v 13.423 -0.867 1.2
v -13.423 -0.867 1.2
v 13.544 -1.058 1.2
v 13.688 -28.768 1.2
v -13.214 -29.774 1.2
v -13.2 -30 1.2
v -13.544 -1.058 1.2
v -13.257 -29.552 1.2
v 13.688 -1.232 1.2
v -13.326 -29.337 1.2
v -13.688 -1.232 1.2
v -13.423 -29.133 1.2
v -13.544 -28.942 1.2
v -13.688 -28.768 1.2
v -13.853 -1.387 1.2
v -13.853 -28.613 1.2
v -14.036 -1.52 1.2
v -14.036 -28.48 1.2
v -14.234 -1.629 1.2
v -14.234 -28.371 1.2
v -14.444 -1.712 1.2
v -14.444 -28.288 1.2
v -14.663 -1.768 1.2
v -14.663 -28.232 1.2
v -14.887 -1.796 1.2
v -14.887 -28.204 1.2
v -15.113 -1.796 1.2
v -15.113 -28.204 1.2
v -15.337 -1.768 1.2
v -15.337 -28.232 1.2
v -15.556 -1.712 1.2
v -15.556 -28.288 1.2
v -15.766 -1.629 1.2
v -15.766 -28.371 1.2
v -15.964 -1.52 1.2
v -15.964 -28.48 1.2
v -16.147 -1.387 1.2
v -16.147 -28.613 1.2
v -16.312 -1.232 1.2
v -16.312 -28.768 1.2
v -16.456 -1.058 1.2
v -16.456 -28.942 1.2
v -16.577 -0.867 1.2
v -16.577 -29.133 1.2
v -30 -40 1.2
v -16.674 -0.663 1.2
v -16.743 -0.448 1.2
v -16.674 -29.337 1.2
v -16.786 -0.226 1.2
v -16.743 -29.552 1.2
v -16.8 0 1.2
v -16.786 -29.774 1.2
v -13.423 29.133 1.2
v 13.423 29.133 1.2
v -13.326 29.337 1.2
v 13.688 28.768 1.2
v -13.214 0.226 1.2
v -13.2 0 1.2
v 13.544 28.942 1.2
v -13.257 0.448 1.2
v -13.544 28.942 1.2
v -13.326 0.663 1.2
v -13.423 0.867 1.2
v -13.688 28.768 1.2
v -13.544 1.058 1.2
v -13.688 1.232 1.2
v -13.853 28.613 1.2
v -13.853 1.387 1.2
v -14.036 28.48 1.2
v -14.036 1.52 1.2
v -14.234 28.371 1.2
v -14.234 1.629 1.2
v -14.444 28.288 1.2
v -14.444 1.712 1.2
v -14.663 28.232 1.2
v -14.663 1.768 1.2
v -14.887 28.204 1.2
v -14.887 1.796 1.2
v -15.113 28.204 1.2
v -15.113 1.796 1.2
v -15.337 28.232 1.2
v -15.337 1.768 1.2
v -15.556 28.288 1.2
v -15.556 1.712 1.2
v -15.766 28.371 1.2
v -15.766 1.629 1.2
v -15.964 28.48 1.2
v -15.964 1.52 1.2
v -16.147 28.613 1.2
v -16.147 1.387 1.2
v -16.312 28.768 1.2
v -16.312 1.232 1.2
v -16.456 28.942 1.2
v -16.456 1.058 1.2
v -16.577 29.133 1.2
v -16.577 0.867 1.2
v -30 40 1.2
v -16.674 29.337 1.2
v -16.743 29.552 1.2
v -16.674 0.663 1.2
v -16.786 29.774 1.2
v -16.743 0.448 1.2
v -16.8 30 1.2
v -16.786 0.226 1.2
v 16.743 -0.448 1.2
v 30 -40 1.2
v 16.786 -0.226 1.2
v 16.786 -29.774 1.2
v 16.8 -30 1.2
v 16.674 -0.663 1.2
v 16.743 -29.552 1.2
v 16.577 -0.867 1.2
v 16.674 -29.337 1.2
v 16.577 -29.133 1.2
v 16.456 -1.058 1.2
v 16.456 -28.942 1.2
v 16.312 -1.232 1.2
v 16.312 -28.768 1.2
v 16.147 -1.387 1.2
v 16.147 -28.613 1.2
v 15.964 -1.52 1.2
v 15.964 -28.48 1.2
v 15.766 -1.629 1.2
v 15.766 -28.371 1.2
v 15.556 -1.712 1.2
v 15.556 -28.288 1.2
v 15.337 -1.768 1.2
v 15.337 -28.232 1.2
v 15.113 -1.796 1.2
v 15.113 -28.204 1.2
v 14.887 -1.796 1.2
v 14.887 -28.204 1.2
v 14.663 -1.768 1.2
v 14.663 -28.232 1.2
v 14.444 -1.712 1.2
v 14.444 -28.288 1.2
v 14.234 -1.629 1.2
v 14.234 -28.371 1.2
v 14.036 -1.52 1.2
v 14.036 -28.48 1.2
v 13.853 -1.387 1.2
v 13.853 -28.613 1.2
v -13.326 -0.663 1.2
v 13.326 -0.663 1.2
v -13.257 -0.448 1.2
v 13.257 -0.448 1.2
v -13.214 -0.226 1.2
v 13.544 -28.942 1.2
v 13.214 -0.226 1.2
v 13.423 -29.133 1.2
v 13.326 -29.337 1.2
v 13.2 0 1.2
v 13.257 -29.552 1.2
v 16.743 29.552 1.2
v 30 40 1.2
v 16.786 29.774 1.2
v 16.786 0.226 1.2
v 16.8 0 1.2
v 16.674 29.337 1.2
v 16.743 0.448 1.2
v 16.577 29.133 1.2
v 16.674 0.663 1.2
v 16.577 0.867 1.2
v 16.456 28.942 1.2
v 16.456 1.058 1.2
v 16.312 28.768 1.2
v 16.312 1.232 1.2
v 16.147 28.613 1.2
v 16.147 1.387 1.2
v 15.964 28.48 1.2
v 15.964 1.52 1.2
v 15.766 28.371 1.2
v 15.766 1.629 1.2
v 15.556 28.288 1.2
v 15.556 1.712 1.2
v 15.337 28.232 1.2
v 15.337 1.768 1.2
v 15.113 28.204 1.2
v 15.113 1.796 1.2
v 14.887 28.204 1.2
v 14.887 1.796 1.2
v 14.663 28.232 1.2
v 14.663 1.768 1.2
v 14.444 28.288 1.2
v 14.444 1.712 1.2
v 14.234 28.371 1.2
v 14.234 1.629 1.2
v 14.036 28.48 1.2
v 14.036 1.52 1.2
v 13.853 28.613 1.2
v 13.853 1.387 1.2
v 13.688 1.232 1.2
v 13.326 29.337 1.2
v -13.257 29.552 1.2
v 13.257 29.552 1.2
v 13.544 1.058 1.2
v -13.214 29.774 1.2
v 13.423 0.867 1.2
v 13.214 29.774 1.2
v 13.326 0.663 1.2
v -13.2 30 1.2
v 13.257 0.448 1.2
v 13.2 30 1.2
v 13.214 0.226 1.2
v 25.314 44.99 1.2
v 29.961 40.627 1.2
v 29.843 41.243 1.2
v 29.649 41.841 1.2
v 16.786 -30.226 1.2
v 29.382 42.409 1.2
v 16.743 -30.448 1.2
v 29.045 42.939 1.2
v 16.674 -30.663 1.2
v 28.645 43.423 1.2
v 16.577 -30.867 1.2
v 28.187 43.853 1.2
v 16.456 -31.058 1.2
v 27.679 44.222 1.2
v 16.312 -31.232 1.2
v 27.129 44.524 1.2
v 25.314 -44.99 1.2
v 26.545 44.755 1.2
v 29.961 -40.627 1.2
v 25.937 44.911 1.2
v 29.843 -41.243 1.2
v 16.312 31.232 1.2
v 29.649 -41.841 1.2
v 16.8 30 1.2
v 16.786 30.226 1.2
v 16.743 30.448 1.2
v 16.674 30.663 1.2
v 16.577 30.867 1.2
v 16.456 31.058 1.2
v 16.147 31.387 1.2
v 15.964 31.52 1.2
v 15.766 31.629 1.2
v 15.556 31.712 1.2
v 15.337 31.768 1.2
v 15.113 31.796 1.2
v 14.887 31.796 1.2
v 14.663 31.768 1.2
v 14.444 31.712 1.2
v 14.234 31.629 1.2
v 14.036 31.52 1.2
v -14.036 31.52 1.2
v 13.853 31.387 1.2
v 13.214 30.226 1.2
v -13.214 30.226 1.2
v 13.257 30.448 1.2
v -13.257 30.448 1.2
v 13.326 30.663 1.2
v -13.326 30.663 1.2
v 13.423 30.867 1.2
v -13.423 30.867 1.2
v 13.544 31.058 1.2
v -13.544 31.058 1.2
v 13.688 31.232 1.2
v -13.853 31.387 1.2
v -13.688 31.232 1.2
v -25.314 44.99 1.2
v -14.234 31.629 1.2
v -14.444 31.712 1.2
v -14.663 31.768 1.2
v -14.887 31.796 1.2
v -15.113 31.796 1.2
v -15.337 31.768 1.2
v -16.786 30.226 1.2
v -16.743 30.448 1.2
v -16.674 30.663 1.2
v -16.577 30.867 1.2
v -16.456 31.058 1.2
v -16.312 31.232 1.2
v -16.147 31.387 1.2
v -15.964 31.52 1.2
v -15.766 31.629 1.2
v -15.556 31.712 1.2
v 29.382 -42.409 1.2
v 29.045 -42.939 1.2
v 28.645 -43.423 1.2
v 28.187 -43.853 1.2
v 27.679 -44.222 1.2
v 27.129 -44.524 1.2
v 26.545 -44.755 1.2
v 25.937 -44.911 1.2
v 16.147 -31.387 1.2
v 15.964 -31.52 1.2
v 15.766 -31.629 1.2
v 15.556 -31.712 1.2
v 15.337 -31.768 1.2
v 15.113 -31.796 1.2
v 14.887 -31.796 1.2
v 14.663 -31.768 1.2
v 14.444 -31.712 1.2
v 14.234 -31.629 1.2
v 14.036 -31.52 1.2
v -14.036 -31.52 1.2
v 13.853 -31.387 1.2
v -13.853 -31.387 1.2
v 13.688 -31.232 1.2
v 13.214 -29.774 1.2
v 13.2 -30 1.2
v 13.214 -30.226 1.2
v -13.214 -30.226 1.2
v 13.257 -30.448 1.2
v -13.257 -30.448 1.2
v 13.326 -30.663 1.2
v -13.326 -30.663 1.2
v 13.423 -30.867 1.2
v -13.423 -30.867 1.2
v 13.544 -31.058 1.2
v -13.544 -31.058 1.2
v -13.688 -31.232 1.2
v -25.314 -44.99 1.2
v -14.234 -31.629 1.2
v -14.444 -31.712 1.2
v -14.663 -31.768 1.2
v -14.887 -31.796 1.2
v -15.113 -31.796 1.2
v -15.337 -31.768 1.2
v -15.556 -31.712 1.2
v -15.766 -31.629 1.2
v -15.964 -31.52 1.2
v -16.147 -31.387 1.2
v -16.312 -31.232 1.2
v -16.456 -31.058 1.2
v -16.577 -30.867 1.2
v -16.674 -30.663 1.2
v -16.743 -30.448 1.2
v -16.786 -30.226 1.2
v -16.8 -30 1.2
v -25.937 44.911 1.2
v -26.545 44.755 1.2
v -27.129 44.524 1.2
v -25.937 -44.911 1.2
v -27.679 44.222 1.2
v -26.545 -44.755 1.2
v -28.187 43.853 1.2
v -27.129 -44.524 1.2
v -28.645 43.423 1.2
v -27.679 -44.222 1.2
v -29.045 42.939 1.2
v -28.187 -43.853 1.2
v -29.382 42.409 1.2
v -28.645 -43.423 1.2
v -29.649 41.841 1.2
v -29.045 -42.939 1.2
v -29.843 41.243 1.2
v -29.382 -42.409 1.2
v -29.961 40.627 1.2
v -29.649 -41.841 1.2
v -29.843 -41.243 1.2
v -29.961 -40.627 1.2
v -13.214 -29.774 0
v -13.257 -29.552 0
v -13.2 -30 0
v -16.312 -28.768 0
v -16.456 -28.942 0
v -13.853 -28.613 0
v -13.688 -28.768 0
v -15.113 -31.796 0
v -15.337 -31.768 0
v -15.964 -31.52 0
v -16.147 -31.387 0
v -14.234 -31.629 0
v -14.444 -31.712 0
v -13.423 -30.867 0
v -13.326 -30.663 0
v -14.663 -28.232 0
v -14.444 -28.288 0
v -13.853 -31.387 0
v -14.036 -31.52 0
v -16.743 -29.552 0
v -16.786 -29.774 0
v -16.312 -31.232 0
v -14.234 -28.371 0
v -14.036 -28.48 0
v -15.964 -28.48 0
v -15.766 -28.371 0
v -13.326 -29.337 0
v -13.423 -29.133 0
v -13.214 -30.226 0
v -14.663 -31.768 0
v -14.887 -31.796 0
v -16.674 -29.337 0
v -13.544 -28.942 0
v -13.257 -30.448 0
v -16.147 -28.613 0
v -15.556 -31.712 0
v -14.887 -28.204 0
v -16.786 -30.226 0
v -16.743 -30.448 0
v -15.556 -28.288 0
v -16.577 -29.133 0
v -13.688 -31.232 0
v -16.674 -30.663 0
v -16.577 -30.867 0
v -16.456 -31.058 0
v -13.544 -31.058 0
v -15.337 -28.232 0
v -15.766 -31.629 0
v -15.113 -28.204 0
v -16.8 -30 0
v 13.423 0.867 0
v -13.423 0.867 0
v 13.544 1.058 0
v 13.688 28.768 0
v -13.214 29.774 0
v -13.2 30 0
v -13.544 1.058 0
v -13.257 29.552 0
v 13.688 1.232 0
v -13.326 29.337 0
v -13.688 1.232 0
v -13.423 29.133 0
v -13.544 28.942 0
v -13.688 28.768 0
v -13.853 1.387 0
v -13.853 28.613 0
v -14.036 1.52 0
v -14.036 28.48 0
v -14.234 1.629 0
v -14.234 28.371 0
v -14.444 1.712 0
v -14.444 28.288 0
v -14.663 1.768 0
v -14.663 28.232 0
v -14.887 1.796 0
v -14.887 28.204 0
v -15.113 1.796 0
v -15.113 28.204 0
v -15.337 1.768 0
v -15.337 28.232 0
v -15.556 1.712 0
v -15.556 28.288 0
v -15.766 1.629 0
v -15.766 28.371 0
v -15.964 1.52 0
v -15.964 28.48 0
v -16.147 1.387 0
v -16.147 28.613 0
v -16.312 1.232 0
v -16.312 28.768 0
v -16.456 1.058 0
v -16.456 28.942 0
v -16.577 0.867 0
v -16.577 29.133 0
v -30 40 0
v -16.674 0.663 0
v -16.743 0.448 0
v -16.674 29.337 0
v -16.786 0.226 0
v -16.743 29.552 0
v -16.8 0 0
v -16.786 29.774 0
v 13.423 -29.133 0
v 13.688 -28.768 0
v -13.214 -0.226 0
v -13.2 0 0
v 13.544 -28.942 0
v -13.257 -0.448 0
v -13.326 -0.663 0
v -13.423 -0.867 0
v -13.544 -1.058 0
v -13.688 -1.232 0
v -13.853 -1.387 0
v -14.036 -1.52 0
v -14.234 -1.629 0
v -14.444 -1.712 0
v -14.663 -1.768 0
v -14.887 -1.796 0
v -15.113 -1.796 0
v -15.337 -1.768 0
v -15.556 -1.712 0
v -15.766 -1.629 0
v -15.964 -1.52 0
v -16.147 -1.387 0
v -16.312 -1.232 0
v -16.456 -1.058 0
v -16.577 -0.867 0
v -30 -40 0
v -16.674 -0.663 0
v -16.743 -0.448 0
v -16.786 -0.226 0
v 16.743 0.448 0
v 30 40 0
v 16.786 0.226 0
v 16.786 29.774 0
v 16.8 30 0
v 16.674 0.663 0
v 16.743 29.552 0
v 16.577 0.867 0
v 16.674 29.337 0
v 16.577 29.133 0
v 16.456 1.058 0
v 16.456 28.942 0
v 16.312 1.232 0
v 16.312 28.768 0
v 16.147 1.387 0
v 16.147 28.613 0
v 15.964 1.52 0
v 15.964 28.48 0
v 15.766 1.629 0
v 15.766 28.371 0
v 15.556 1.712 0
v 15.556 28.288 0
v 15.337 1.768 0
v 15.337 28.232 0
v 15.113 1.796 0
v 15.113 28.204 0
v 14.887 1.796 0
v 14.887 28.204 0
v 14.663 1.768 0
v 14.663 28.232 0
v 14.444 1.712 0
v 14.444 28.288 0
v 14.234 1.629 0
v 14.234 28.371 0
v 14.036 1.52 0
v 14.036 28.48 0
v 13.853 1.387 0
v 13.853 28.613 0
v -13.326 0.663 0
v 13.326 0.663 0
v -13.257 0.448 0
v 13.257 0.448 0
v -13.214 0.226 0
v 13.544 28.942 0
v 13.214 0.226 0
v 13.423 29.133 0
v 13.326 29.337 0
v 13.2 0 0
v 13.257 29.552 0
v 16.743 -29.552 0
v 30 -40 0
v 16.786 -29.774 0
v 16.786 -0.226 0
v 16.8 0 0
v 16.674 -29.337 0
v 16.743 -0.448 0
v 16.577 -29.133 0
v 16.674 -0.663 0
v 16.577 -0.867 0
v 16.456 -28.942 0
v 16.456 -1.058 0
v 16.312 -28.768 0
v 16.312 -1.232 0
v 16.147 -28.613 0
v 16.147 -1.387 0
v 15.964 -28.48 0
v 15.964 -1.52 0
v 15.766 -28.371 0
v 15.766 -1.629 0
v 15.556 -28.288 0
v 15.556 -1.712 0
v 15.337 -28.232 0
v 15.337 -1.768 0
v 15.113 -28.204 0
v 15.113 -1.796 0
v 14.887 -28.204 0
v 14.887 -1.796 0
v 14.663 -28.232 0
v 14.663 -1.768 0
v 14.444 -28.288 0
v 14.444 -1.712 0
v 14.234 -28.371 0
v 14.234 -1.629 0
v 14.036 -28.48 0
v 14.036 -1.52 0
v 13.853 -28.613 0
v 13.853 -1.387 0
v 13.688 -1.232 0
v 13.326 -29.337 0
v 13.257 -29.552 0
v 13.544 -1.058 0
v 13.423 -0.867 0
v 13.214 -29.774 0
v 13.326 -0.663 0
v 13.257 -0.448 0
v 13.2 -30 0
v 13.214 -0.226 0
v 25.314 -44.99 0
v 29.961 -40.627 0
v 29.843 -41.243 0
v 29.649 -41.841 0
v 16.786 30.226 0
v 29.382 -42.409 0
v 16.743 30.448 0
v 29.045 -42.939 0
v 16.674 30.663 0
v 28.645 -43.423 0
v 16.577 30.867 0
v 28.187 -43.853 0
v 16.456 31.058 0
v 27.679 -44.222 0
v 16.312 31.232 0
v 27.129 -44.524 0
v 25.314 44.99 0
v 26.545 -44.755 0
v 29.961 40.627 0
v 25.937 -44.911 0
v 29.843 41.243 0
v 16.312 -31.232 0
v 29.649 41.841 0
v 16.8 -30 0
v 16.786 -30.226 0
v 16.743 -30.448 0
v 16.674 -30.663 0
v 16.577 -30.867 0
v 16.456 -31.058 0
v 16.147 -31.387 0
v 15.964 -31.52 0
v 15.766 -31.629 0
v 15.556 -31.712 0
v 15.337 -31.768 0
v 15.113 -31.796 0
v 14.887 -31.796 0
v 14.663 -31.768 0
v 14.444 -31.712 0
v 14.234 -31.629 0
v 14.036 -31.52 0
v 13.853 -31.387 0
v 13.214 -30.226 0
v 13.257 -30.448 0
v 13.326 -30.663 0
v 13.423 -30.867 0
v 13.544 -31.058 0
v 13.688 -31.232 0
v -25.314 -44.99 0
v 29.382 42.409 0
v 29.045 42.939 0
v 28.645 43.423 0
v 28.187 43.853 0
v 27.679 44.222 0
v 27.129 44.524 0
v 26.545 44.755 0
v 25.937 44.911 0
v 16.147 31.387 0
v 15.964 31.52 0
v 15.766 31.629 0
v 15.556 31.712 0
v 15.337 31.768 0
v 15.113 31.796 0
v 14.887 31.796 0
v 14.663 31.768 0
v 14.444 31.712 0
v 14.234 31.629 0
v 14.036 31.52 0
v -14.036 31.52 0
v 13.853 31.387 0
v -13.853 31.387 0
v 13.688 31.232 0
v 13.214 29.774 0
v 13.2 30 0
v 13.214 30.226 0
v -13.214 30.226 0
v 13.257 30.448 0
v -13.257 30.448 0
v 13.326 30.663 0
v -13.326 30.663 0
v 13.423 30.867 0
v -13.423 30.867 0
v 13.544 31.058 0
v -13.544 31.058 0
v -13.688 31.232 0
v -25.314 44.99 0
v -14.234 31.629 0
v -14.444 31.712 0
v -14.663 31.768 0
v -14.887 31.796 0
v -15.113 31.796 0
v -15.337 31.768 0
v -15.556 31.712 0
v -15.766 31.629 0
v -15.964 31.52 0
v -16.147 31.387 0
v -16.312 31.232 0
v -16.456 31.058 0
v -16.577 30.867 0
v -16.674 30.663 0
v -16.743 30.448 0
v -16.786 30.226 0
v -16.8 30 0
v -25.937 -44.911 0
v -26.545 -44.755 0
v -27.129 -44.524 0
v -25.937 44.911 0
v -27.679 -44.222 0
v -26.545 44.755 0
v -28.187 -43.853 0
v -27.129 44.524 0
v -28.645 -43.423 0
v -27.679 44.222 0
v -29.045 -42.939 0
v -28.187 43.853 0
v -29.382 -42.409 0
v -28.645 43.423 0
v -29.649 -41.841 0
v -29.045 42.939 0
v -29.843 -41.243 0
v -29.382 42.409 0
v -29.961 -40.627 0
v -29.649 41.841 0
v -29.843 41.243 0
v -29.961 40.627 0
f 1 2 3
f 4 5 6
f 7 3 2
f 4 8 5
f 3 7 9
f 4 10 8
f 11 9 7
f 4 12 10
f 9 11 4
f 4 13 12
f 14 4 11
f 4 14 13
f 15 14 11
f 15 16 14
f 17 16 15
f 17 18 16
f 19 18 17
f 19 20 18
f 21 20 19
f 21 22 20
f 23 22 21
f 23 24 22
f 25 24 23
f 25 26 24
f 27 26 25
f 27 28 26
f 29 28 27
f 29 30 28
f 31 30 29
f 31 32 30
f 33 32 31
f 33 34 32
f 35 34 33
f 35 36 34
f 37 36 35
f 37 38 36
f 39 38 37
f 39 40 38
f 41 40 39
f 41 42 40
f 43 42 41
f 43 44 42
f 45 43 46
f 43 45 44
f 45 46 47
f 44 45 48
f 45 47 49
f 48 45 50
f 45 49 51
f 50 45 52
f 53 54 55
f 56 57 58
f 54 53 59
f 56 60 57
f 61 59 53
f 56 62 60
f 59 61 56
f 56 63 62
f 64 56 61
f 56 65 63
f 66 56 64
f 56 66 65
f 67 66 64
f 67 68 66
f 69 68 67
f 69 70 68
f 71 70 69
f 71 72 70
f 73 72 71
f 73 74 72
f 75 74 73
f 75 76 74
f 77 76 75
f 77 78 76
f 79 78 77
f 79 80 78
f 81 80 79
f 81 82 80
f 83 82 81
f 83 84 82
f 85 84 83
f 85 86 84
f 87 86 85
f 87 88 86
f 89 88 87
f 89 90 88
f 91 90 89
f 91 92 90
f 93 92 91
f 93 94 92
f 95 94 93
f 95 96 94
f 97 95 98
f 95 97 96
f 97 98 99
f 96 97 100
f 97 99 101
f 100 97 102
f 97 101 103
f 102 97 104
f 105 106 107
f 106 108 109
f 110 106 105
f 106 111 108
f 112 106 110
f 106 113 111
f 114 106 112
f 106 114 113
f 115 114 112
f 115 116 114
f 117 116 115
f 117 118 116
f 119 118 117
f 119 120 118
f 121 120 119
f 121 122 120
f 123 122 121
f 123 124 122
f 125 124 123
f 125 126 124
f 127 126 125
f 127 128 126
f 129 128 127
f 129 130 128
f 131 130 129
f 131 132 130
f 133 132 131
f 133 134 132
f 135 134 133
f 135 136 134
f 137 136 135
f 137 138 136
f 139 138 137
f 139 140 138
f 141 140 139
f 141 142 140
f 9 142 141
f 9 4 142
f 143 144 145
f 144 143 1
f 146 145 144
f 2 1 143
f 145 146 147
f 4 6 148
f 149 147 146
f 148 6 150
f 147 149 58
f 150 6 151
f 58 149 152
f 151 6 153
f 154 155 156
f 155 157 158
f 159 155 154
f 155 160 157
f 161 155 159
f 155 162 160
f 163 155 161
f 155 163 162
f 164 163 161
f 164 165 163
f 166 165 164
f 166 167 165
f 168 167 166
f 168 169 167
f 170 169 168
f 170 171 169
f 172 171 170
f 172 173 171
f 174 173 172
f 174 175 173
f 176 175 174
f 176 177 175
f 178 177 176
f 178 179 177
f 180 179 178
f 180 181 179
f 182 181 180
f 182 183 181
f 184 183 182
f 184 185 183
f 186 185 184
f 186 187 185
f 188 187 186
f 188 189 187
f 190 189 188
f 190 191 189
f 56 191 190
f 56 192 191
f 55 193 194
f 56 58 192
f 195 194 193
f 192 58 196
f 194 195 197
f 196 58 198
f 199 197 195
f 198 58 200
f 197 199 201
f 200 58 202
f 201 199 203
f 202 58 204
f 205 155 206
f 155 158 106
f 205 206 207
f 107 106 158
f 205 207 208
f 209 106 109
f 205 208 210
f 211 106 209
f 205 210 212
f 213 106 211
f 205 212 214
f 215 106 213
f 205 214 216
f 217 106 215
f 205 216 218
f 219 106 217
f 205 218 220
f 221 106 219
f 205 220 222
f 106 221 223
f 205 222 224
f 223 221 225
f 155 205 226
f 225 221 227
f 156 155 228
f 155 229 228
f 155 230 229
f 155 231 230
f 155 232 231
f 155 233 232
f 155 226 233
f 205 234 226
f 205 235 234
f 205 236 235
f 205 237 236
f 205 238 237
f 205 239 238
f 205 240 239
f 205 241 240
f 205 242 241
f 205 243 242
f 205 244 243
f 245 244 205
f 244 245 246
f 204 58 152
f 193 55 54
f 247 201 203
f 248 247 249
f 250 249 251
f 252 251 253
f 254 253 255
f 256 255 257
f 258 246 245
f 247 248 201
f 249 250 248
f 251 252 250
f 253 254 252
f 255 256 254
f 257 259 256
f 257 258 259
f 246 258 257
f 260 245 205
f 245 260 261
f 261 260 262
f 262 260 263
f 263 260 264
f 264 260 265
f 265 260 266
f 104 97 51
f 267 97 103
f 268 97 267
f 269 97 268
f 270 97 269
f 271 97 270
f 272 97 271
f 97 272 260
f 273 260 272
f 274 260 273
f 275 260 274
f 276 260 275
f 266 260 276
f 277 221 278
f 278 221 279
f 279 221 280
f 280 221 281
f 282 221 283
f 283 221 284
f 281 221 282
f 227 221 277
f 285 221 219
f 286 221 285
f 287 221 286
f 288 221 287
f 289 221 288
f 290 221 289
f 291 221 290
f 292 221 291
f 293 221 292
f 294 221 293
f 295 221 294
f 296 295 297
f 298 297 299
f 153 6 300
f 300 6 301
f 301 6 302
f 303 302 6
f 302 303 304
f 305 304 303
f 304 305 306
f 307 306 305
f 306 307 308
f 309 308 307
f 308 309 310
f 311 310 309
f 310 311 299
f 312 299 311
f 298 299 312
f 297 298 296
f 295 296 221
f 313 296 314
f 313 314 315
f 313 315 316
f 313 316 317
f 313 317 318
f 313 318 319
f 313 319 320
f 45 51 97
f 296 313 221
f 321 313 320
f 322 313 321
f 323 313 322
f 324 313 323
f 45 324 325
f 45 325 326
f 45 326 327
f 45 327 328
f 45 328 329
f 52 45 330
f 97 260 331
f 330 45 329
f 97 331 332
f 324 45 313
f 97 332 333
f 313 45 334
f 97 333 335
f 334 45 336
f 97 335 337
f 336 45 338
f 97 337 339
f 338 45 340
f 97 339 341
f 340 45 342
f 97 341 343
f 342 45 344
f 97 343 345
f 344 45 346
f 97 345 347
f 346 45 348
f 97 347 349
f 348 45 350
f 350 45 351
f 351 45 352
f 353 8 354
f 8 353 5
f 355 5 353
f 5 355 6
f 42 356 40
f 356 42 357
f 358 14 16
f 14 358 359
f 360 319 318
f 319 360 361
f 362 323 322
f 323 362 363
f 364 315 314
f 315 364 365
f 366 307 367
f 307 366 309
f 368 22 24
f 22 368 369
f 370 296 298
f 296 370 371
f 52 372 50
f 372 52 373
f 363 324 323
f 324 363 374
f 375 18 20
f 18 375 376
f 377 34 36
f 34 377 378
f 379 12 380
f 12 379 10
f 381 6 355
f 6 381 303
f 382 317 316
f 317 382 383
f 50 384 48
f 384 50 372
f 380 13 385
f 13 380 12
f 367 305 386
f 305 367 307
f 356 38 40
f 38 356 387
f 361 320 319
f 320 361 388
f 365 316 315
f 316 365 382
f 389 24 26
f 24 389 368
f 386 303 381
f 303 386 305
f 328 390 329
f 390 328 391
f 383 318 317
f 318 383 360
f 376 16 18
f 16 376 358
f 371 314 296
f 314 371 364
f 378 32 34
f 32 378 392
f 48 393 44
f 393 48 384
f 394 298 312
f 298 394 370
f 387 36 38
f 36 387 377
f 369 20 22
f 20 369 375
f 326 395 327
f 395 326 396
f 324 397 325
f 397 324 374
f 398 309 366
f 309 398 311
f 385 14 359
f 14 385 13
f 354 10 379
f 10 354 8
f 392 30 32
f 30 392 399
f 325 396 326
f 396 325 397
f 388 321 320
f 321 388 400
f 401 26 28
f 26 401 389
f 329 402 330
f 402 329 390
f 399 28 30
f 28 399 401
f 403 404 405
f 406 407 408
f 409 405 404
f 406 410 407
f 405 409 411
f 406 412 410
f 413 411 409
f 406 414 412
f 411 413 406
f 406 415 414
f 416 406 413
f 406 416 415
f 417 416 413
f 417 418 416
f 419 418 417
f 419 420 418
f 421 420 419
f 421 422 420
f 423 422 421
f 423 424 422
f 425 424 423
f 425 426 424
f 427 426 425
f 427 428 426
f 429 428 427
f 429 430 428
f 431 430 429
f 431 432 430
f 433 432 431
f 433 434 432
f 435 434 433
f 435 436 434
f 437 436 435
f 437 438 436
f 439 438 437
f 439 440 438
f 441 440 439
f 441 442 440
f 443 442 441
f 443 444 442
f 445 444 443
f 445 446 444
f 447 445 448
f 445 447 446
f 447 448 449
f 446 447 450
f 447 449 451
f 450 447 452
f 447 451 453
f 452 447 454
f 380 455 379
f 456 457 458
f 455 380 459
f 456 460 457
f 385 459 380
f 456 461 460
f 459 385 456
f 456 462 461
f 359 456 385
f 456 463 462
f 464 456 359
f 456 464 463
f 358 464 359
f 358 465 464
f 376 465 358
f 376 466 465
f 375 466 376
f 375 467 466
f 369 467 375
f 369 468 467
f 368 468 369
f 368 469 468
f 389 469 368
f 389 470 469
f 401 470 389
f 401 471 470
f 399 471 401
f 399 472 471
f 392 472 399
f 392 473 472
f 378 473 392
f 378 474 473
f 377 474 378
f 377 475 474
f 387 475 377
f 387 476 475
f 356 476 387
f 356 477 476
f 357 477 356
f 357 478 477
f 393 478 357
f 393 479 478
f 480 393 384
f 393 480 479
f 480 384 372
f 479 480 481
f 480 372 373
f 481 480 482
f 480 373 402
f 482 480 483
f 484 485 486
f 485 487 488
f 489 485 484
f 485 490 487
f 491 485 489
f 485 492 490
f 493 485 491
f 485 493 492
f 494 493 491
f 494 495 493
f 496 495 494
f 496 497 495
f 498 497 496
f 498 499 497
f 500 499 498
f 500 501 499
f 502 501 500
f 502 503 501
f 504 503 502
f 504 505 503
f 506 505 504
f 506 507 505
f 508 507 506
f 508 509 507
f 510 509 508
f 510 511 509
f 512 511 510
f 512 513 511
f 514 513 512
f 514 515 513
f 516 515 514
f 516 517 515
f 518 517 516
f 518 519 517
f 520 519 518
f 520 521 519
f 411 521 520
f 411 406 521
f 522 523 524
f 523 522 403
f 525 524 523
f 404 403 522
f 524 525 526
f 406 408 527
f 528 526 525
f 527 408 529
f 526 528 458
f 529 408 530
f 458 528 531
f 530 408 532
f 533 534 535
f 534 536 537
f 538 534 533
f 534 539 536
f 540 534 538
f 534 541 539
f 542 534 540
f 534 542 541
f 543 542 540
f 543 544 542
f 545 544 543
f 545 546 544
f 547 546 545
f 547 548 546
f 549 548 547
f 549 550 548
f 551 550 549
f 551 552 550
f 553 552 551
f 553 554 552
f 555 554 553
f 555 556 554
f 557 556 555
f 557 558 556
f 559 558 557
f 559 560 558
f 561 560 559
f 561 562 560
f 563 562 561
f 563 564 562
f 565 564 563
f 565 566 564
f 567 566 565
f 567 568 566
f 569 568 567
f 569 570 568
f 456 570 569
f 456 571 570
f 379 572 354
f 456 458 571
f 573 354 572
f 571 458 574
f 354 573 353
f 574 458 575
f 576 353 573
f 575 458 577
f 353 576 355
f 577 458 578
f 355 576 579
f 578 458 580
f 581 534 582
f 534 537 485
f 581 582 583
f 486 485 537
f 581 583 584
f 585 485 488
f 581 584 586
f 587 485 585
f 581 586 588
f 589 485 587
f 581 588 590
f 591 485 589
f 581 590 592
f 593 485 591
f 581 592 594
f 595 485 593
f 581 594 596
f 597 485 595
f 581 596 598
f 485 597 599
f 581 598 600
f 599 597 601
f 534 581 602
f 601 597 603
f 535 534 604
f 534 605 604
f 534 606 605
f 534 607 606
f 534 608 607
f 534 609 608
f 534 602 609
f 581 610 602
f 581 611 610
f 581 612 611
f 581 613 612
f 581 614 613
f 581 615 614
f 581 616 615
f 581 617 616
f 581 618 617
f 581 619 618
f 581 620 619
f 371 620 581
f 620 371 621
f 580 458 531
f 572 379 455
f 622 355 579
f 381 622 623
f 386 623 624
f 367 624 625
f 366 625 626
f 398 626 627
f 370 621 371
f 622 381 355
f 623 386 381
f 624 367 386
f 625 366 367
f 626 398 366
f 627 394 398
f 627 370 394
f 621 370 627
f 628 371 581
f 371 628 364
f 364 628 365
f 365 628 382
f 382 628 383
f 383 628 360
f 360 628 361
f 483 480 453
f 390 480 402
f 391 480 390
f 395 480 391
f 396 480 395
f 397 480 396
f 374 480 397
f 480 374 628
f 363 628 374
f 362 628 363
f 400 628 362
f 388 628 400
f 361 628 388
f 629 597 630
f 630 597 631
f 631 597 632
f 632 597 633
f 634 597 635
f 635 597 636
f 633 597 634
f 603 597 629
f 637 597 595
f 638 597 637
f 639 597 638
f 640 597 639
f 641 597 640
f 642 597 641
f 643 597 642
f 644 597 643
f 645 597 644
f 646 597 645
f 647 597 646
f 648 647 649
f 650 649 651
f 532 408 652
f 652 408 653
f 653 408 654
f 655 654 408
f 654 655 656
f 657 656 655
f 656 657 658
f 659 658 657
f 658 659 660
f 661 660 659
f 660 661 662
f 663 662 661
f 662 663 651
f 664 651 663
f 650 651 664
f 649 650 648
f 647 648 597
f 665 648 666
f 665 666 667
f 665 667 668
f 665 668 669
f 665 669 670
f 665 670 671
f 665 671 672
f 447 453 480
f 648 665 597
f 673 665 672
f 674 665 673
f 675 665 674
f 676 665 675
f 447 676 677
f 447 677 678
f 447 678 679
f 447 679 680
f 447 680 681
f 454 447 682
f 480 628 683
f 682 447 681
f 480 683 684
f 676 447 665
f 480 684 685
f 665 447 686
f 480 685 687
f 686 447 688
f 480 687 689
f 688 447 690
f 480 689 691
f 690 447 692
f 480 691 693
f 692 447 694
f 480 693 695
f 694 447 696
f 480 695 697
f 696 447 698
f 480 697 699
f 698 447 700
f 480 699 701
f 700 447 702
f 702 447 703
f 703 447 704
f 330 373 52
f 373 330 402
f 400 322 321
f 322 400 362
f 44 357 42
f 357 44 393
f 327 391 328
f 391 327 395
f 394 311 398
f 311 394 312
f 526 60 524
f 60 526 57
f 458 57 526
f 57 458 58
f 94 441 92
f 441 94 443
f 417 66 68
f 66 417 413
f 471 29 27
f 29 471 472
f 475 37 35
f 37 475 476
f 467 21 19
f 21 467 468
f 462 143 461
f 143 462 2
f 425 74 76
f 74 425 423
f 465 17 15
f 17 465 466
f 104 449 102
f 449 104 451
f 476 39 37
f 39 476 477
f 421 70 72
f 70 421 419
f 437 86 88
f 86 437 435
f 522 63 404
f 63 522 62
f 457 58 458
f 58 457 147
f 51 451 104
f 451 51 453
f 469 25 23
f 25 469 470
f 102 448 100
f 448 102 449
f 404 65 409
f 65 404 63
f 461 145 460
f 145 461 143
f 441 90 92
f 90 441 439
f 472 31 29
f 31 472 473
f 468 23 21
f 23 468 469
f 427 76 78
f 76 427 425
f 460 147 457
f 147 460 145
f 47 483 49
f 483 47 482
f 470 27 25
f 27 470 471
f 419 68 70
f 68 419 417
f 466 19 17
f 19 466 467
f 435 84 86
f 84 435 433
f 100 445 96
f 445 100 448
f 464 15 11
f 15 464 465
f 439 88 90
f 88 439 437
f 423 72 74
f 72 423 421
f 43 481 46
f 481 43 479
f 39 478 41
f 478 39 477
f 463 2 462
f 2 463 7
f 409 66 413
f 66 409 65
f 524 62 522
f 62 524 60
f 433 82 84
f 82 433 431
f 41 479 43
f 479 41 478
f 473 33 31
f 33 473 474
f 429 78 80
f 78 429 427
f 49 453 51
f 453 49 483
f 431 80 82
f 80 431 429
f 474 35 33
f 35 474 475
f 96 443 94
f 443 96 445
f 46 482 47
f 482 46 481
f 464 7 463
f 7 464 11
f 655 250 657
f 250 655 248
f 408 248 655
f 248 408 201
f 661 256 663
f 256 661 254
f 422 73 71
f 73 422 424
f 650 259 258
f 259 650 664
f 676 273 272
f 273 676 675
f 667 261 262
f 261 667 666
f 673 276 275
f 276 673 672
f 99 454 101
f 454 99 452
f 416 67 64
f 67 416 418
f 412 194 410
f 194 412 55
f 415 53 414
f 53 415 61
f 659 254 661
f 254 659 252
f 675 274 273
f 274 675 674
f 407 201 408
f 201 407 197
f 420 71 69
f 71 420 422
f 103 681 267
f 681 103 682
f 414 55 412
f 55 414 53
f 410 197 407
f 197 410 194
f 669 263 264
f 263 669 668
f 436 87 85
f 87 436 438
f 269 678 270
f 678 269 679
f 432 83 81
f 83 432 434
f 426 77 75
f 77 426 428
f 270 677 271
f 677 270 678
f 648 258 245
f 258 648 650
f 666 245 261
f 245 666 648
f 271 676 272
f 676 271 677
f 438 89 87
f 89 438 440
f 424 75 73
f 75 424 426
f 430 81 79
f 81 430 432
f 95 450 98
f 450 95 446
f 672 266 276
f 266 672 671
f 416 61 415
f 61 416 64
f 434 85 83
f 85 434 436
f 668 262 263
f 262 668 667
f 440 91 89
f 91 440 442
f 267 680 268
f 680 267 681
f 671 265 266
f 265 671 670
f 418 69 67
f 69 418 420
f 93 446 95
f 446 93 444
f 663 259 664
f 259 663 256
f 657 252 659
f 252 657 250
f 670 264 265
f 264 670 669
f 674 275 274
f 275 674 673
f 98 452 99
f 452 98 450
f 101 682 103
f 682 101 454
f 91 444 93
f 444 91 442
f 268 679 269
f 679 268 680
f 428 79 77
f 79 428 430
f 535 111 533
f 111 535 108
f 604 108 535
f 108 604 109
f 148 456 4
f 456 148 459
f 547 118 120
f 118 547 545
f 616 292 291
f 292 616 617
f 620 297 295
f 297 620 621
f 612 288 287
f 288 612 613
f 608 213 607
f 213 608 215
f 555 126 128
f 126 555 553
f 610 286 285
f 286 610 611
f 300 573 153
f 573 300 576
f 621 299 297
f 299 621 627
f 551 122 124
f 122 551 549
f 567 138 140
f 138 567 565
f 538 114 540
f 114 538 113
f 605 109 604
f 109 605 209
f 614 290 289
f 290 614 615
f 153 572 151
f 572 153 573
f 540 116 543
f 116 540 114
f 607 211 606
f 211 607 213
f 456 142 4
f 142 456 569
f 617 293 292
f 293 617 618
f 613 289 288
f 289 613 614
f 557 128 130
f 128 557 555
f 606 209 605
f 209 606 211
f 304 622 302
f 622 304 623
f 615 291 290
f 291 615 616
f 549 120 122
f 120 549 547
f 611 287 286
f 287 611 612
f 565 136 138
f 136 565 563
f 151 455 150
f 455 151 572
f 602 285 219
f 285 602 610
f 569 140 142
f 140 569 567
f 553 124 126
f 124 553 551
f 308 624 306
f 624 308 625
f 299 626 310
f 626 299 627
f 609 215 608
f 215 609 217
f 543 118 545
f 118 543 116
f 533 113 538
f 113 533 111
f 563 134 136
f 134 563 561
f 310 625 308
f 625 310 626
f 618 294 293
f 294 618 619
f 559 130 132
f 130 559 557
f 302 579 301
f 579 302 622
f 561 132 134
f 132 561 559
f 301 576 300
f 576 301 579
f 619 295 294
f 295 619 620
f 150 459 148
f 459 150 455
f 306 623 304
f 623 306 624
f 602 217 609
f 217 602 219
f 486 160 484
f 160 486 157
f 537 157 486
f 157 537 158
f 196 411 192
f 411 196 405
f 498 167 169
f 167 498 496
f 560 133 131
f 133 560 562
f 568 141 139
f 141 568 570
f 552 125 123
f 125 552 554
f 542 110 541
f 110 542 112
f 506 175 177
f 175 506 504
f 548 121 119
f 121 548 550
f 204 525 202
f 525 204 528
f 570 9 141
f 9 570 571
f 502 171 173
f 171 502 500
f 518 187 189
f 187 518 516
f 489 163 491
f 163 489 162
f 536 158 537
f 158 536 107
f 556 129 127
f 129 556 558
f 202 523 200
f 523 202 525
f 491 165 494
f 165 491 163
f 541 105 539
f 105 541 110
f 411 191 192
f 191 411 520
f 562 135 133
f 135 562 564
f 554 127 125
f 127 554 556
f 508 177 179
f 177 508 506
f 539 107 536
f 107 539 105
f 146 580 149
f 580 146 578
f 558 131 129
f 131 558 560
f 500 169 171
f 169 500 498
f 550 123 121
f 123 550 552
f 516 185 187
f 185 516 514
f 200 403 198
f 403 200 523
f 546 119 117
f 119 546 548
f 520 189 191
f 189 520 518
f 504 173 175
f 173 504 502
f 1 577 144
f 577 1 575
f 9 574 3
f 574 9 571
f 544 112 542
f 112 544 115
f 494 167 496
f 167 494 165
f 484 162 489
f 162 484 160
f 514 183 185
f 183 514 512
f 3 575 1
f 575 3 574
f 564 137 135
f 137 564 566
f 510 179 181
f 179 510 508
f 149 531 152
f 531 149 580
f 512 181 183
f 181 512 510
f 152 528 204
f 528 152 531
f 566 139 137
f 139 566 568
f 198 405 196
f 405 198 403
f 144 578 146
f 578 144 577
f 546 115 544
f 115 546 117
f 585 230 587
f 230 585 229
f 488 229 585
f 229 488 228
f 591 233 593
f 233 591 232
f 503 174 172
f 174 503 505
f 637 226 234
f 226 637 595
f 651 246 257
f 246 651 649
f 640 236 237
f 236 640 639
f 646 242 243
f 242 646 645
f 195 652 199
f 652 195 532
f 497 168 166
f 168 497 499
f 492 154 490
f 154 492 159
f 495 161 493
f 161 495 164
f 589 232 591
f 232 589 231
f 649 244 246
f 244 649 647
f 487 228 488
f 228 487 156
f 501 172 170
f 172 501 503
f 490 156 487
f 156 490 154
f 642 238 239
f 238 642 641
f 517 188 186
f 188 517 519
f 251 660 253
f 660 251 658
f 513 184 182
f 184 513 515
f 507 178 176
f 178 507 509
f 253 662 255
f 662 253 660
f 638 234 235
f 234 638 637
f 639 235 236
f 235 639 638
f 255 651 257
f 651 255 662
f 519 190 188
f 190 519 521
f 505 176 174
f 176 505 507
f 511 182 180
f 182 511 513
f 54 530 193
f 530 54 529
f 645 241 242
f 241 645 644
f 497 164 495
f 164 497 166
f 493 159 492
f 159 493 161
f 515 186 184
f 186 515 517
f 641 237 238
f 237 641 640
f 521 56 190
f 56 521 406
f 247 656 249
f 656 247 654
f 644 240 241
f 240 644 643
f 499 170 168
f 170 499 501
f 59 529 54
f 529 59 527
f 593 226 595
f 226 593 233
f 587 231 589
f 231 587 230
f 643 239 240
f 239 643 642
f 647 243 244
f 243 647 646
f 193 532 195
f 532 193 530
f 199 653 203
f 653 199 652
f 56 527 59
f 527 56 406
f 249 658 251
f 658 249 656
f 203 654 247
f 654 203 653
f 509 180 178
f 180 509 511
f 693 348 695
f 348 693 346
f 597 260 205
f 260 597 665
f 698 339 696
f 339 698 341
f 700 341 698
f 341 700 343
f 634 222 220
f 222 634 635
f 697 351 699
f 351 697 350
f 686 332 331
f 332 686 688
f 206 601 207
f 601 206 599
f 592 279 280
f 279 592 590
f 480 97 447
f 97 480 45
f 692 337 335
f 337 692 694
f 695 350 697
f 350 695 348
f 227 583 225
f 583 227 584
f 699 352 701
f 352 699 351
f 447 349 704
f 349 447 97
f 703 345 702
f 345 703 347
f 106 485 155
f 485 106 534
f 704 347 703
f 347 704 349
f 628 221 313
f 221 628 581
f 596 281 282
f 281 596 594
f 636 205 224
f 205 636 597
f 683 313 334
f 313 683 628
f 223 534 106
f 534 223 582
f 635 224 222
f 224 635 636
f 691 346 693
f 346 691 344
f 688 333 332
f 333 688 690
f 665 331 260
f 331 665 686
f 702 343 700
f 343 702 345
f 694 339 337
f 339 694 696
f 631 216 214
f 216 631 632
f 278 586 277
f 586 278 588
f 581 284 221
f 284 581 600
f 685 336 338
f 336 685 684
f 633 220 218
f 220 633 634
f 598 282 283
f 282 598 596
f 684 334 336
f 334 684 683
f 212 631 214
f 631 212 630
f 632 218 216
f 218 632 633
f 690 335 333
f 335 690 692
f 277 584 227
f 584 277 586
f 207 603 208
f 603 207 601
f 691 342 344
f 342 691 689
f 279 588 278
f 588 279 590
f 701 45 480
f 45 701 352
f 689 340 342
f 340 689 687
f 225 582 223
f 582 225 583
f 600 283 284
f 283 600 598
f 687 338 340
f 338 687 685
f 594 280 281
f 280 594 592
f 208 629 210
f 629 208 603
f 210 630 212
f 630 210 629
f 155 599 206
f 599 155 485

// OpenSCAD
$fn = 50;


difference() {
	union() {
		hull() {
			translate(v = [-25.0000000000, 40.0000000000, 0]) {
				cylinder(h = 12, r = 5);
			}
			translate(v = [25.0000000000, 40.0000000000, 0]) {
				cylinder(h = 12, r = 5);
			}
			translate(v = [-25.0000000000, -40.0000000000, 0]) {
				cylinder(h = 12, r = 5);
			}
			translate(v = [25.0000000000, -40.0000000000, 0]) {
				cylinder(h = 12, r = 5);
			}
		}
	}
	union() {
		translate(v = [0, 0, 1.2000000000]) {
			hull() {
				translate(v = [-25.0000000000, 40.0000000000, 0]) {
					cylinder(h = 10.8000000000, r = 3.8000000000);
				}
				translate(v = [25.0000000000, 40.0000000000, 0]) {
					cylinder(h = 10.8000000000, r = 3.8000000000);
				}
				translate(v = [-25.0000000000, -40.0000000000, 0]) {
					cylinder(h = 10.8000000000, r = 3.8000000000);
				}
				translate(v = [25.0000000000, -40.0000000000, 0]) {
					cylinder(h = 10.8000000000, r = 3.8000000000);
				}
			}
		}
		#translate(v = [-15.0000000000, -30.0000000000, 0]) {
			cylinder(h = 1.2000000000, r = 1.8000000000);
		}
		#translate(v = [-15.0000000000, 0.0000000000, 0]) {
			cylinder(h = 1.2000000000, r = 1.8000000000);
		}
		#translate(v = [-15.0000000000, 30.0000000000, 0]) {
			cylinder(h = 1.2000000000, r = 1.8000000000);
		}
		#translate(v = [15.0000000000, -30.0000000000, 0]) {
			cylinder(h = 1.2000000000, r = 1.8000000000);
		}
		#translate(v = [15.0000000000, 0.0000000000, 0]) {
			cylinder(h = 1.2000000000, r = 1.8000000000);
		}
		#translate(v = [15.0000000000, 30.0000000000, 0]) {
			cylinder(h = 1.2000000000, r = 1.8000000000);
		}
		translate(v = [-250.0000000000, -250.0000000000, 1.2000000000]) {
			cube(size = [500, 500, 500]);
		}
		translate(v = [-250.0000000000, -250.0000000000, 1.2000000000]) {
			cube(size = [500, 500, 500]);
		}
		translate(v = [-250.0000000000, -250.0000000000, 1.2000000000]) {
			cube(size = [500, 500, 500]);
		}
	}
}
